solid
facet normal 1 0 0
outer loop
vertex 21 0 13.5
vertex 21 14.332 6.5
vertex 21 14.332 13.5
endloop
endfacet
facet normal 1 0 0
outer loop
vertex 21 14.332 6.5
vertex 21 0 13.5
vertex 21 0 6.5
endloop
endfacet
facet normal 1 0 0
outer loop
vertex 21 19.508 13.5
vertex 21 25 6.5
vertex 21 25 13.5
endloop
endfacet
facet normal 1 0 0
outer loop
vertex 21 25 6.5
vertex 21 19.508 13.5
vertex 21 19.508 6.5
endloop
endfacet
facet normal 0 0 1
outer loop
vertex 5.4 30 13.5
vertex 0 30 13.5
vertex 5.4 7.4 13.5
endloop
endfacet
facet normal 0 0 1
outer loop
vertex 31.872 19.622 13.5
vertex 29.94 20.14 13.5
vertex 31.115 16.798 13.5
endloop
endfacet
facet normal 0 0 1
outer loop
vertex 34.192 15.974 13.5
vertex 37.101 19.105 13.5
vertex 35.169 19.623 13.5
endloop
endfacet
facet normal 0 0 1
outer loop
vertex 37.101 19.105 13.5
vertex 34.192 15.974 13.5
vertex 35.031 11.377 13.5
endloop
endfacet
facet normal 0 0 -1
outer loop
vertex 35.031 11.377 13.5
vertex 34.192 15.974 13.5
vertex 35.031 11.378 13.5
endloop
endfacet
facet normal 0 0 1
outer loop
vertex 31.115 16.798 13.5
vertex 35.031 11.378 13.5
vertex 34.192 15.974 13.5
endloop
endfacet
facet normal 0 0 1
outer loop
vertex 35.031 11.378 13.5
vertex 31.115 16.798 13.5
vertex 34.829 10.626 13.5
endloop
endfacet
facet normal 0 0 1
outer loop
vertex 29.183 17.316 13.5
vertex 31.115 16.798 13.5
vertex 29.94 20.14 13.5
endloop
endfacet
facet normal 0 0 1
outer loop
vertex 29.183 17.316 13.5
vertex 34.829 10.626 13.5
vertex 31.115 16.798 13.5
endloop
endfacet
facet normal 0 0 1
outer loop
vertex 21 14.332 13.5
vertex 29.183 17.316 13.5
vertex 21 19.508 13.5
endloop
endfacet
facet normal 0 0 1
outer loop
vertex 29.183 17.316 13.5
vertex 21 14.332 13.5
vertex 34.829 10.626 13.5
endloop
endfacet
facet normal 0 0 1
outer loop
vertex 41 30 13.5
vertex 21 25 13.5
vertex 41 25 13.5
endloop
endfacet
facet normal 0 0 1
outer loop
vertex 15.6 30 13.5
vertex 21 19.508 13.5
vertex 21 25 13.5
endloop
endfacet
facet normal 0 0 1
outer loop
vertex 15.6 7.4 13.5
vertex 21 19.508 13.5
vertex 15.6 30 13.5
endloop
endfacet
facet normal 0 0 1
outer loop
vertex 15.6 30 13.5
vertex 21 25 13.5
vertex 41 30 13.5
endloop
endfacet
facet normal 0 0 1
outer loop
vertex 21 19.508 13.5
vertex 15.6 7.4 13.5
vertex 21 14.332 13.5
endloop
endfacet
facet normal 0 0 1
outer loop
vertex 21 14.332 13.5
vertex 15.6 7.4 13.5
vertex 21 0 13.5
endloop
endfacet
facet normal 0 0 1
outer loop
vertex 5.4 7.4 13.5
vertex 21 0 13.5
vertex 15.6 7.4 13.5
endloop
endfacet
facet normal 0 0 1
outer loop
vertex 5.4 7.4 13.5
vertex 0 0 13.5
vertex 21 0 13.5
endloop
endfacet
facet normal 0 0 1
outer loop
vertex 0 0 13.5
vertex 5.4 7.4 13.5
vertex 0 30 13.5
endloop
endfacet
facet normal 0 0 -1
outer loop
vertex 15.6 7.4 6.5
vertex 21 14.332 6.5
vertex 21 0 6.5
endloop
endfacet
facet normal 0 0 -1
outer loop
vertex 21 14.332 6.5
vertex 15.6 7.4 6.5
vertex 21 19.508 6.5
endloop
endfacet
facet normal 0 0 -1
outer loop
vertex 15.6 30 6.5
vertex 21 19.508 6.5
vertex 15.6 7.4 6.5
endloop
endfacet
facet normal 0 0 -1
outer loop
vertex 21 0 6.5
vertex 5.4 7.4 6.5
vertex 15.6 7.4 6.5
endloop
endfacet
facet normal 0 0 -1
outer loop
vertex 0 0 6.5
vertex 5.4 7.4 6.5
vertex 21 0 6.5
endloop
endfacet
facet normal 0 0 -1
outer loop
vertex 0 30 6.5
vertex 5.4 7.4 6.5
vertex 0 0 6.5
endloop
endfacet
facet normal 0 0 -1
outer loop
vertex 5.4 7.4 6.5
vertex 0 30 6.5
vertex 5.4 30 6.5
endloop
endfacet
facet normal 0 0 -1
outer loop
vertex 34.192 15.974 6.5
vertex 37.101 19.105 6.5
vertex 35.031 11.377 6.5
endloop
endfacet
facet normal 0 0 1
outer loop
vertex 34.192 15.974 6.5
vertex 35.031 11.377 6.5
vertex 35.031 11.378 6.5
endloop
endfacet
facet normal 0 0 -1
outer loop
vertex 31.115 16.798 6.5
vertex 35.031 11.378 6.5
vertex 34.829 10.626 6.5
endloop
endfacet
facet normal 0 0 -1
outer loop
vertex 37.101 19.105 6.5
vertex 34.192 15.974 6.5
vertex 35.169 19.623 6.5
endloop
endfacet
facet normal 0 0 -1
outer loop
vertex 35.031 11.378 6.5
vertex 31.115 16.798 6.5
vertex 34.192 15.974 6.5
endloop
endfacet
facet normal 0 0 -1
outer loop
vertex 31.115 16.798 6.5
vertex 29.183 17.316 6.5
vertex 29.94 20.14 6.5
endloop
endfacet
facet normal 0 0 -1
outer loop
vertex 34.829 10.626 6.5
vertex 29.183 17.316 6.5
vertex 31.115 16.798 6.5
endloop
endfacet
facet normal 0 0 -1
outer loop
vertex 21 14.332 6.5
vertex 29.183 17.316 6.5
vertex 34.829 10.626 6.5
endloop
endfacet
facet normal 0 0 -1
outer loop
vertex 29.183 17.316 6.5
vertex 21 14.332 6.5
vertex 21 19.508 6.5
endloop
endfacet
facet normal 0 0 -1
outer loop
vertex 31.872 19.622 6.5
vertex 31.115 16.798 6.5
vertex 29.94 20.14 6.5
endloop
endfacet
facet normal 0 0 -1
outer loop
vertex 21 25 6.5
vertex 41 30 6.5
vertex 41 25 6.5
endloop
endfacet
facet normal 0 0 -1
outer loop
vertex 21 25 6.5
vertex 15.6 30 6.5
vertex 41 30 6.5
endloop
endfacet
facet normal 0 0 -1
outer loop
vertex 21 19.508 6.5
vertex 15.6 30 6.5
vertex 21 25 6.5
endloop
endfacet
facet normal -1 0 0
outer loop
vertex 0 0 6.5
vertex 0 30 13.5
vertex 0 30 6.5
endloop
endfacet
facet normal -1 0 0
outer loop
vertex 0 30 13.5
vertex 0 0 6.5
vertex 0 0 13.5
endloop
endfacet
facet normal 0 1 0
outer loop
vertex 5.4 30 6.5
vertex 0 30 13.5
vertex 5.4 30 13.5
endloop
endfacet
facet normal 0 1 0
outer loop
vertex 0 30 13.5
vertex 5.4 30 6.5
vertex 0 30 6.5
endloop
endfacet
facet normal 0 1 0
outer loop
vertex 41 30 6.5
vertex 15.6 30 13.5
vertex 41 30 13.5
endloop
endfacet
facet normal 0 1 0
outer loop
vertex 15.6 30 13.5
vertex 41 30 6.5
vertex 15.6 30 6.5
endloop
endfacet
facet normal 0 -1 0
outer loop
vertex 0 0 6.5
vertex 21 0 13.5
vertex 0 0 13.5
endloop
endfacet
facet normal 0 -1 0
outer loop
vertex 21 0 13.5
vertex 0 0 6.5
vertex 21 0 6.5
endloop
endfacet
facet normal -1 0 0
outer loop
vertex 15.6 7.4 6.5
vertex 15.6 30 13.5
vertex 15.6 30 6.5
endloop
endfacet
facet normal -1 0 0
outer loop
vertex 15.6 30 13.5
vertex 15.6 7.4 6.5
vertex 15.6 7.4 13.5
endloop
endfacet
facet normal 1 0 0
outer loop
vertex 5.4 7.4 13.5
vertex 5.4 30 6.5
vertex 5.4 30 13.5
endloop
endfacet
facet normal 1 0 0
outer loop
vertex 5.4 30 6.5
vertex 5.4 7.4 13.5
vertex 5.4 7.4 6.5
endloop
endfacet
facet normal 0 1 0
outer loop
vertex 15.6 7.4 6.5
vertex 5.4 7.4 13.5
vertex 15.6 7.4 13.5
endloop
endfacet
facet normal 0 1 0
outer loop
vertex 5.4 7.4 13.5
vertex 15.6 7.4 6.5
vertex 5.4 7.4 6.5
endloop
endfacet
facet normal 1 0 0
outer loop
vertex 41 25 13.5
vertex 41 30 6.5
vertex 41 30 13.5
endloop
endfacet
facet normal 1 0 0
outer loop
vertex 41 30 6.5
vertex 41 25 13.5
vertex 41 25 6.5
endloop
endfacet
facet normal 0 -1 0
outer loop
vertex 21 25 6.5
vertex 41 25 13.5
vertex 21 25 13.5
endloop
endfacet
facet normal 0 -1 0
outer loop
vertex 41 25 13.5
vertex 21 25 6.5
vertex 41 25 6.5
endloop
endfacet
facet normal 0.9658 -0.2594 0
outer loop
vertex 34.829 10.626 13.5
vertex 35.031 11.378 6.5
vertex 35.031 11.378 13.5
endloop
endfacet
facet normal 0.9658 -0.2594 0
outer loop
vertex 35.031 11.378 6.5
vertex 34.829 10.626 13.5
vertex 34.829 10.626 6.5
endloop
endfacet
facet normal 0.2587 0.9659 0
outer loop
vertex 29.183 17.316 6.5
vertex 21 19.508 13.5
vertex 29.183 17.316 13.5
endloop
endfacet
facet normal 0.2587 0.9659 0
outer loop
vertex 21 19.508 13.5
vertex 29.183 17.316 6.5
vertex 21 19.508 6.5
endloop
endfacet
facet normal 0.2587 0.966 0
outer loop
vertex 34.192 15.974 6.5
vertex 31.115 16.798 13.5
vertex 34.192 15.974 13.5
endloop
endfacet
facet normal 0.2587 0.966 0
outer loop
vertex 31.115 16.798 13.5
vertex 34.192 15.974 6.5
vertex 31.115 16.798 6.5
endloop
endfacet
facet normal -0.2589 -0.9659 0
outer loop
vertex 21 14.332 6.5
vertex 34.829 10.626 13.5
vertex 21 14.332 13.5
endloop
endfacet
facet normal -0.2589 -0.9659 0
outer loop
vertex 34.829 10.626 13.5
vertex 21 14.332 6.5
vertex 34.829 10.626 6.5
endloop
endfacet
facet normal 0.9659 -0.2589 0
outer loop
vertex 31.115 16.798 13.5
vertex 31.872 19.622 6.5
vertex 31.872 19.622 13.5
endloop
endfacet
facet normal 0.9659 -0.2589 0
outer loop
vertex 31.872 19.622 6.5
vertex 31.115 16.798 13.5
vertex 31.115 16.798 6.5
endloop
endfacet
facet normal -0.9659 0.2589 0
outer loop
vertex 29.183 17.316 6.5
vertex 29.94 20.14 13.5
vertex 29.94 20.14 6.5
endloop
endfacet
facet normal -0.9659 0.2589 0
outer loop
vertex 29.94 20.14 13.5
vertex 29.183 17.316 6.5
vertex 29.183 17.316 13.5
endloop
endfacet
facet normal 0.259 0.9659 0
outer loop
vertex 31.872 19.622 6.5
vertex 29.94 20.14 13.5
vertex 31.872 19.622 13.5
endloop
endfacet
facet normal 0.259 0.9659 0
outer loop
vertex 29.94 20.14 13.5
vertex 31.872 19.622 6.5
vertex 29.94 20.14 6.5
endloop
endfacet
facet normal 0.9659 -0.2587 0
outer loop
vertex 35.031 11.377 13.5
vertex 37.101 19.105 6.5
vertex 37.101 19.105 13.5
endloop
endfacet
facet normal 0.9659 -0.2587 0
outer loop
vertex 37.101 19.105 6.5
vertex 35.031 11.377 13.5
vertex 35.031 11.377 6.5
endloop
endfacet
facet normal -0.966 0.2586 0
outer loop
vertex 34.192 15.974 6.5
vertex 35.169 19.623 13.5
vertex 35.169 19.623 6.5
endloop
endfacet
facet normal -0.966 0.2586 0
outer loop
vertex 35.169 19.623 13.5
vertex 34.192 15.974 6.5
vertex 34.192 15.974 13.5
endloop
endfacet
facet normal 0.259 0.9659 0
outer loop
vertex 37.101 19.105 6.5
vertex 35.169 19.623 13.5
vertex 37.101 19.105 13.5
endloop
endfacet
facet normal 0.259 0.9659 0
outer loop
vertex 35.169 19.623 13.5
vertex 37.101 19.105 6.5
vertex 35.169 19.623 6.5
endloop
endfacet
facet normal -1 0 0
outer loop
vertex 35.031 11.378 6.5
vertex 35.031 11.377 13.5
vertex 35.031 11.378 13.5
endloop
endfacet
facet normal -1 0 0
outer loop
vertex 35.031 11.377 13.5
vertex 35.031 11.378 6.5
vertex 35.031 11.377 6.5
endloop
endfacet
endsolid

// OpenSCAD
{
module holder(){
	difference() {
		translate([10.5, 15, 0])
			cube([21, 30, 7], center = true);	
		union() {
			translate([10.5, 19.2, 0])
				cube([10.2, 23.6, 10], center = true);
		}

	}
	translate([31, 27.5, 0])
		cube([20, 5, 7], center = true);
	translate([26.3, 15.5, 0]) rotate(-15, [0, 0, 1])
		cube([19, 5, 7], center = true);
	translate([30, 16.5, 0]) rotate(-15, [0, 0, 1])
		cube([2, 7, 7], center = true);
	translate([35.1, 15.5, 0]) rotate(-15, [0, 0, 1])
		cube([2, 8, 7], center = true);
}
translate([ 0, 0, 10]) holder();
}
